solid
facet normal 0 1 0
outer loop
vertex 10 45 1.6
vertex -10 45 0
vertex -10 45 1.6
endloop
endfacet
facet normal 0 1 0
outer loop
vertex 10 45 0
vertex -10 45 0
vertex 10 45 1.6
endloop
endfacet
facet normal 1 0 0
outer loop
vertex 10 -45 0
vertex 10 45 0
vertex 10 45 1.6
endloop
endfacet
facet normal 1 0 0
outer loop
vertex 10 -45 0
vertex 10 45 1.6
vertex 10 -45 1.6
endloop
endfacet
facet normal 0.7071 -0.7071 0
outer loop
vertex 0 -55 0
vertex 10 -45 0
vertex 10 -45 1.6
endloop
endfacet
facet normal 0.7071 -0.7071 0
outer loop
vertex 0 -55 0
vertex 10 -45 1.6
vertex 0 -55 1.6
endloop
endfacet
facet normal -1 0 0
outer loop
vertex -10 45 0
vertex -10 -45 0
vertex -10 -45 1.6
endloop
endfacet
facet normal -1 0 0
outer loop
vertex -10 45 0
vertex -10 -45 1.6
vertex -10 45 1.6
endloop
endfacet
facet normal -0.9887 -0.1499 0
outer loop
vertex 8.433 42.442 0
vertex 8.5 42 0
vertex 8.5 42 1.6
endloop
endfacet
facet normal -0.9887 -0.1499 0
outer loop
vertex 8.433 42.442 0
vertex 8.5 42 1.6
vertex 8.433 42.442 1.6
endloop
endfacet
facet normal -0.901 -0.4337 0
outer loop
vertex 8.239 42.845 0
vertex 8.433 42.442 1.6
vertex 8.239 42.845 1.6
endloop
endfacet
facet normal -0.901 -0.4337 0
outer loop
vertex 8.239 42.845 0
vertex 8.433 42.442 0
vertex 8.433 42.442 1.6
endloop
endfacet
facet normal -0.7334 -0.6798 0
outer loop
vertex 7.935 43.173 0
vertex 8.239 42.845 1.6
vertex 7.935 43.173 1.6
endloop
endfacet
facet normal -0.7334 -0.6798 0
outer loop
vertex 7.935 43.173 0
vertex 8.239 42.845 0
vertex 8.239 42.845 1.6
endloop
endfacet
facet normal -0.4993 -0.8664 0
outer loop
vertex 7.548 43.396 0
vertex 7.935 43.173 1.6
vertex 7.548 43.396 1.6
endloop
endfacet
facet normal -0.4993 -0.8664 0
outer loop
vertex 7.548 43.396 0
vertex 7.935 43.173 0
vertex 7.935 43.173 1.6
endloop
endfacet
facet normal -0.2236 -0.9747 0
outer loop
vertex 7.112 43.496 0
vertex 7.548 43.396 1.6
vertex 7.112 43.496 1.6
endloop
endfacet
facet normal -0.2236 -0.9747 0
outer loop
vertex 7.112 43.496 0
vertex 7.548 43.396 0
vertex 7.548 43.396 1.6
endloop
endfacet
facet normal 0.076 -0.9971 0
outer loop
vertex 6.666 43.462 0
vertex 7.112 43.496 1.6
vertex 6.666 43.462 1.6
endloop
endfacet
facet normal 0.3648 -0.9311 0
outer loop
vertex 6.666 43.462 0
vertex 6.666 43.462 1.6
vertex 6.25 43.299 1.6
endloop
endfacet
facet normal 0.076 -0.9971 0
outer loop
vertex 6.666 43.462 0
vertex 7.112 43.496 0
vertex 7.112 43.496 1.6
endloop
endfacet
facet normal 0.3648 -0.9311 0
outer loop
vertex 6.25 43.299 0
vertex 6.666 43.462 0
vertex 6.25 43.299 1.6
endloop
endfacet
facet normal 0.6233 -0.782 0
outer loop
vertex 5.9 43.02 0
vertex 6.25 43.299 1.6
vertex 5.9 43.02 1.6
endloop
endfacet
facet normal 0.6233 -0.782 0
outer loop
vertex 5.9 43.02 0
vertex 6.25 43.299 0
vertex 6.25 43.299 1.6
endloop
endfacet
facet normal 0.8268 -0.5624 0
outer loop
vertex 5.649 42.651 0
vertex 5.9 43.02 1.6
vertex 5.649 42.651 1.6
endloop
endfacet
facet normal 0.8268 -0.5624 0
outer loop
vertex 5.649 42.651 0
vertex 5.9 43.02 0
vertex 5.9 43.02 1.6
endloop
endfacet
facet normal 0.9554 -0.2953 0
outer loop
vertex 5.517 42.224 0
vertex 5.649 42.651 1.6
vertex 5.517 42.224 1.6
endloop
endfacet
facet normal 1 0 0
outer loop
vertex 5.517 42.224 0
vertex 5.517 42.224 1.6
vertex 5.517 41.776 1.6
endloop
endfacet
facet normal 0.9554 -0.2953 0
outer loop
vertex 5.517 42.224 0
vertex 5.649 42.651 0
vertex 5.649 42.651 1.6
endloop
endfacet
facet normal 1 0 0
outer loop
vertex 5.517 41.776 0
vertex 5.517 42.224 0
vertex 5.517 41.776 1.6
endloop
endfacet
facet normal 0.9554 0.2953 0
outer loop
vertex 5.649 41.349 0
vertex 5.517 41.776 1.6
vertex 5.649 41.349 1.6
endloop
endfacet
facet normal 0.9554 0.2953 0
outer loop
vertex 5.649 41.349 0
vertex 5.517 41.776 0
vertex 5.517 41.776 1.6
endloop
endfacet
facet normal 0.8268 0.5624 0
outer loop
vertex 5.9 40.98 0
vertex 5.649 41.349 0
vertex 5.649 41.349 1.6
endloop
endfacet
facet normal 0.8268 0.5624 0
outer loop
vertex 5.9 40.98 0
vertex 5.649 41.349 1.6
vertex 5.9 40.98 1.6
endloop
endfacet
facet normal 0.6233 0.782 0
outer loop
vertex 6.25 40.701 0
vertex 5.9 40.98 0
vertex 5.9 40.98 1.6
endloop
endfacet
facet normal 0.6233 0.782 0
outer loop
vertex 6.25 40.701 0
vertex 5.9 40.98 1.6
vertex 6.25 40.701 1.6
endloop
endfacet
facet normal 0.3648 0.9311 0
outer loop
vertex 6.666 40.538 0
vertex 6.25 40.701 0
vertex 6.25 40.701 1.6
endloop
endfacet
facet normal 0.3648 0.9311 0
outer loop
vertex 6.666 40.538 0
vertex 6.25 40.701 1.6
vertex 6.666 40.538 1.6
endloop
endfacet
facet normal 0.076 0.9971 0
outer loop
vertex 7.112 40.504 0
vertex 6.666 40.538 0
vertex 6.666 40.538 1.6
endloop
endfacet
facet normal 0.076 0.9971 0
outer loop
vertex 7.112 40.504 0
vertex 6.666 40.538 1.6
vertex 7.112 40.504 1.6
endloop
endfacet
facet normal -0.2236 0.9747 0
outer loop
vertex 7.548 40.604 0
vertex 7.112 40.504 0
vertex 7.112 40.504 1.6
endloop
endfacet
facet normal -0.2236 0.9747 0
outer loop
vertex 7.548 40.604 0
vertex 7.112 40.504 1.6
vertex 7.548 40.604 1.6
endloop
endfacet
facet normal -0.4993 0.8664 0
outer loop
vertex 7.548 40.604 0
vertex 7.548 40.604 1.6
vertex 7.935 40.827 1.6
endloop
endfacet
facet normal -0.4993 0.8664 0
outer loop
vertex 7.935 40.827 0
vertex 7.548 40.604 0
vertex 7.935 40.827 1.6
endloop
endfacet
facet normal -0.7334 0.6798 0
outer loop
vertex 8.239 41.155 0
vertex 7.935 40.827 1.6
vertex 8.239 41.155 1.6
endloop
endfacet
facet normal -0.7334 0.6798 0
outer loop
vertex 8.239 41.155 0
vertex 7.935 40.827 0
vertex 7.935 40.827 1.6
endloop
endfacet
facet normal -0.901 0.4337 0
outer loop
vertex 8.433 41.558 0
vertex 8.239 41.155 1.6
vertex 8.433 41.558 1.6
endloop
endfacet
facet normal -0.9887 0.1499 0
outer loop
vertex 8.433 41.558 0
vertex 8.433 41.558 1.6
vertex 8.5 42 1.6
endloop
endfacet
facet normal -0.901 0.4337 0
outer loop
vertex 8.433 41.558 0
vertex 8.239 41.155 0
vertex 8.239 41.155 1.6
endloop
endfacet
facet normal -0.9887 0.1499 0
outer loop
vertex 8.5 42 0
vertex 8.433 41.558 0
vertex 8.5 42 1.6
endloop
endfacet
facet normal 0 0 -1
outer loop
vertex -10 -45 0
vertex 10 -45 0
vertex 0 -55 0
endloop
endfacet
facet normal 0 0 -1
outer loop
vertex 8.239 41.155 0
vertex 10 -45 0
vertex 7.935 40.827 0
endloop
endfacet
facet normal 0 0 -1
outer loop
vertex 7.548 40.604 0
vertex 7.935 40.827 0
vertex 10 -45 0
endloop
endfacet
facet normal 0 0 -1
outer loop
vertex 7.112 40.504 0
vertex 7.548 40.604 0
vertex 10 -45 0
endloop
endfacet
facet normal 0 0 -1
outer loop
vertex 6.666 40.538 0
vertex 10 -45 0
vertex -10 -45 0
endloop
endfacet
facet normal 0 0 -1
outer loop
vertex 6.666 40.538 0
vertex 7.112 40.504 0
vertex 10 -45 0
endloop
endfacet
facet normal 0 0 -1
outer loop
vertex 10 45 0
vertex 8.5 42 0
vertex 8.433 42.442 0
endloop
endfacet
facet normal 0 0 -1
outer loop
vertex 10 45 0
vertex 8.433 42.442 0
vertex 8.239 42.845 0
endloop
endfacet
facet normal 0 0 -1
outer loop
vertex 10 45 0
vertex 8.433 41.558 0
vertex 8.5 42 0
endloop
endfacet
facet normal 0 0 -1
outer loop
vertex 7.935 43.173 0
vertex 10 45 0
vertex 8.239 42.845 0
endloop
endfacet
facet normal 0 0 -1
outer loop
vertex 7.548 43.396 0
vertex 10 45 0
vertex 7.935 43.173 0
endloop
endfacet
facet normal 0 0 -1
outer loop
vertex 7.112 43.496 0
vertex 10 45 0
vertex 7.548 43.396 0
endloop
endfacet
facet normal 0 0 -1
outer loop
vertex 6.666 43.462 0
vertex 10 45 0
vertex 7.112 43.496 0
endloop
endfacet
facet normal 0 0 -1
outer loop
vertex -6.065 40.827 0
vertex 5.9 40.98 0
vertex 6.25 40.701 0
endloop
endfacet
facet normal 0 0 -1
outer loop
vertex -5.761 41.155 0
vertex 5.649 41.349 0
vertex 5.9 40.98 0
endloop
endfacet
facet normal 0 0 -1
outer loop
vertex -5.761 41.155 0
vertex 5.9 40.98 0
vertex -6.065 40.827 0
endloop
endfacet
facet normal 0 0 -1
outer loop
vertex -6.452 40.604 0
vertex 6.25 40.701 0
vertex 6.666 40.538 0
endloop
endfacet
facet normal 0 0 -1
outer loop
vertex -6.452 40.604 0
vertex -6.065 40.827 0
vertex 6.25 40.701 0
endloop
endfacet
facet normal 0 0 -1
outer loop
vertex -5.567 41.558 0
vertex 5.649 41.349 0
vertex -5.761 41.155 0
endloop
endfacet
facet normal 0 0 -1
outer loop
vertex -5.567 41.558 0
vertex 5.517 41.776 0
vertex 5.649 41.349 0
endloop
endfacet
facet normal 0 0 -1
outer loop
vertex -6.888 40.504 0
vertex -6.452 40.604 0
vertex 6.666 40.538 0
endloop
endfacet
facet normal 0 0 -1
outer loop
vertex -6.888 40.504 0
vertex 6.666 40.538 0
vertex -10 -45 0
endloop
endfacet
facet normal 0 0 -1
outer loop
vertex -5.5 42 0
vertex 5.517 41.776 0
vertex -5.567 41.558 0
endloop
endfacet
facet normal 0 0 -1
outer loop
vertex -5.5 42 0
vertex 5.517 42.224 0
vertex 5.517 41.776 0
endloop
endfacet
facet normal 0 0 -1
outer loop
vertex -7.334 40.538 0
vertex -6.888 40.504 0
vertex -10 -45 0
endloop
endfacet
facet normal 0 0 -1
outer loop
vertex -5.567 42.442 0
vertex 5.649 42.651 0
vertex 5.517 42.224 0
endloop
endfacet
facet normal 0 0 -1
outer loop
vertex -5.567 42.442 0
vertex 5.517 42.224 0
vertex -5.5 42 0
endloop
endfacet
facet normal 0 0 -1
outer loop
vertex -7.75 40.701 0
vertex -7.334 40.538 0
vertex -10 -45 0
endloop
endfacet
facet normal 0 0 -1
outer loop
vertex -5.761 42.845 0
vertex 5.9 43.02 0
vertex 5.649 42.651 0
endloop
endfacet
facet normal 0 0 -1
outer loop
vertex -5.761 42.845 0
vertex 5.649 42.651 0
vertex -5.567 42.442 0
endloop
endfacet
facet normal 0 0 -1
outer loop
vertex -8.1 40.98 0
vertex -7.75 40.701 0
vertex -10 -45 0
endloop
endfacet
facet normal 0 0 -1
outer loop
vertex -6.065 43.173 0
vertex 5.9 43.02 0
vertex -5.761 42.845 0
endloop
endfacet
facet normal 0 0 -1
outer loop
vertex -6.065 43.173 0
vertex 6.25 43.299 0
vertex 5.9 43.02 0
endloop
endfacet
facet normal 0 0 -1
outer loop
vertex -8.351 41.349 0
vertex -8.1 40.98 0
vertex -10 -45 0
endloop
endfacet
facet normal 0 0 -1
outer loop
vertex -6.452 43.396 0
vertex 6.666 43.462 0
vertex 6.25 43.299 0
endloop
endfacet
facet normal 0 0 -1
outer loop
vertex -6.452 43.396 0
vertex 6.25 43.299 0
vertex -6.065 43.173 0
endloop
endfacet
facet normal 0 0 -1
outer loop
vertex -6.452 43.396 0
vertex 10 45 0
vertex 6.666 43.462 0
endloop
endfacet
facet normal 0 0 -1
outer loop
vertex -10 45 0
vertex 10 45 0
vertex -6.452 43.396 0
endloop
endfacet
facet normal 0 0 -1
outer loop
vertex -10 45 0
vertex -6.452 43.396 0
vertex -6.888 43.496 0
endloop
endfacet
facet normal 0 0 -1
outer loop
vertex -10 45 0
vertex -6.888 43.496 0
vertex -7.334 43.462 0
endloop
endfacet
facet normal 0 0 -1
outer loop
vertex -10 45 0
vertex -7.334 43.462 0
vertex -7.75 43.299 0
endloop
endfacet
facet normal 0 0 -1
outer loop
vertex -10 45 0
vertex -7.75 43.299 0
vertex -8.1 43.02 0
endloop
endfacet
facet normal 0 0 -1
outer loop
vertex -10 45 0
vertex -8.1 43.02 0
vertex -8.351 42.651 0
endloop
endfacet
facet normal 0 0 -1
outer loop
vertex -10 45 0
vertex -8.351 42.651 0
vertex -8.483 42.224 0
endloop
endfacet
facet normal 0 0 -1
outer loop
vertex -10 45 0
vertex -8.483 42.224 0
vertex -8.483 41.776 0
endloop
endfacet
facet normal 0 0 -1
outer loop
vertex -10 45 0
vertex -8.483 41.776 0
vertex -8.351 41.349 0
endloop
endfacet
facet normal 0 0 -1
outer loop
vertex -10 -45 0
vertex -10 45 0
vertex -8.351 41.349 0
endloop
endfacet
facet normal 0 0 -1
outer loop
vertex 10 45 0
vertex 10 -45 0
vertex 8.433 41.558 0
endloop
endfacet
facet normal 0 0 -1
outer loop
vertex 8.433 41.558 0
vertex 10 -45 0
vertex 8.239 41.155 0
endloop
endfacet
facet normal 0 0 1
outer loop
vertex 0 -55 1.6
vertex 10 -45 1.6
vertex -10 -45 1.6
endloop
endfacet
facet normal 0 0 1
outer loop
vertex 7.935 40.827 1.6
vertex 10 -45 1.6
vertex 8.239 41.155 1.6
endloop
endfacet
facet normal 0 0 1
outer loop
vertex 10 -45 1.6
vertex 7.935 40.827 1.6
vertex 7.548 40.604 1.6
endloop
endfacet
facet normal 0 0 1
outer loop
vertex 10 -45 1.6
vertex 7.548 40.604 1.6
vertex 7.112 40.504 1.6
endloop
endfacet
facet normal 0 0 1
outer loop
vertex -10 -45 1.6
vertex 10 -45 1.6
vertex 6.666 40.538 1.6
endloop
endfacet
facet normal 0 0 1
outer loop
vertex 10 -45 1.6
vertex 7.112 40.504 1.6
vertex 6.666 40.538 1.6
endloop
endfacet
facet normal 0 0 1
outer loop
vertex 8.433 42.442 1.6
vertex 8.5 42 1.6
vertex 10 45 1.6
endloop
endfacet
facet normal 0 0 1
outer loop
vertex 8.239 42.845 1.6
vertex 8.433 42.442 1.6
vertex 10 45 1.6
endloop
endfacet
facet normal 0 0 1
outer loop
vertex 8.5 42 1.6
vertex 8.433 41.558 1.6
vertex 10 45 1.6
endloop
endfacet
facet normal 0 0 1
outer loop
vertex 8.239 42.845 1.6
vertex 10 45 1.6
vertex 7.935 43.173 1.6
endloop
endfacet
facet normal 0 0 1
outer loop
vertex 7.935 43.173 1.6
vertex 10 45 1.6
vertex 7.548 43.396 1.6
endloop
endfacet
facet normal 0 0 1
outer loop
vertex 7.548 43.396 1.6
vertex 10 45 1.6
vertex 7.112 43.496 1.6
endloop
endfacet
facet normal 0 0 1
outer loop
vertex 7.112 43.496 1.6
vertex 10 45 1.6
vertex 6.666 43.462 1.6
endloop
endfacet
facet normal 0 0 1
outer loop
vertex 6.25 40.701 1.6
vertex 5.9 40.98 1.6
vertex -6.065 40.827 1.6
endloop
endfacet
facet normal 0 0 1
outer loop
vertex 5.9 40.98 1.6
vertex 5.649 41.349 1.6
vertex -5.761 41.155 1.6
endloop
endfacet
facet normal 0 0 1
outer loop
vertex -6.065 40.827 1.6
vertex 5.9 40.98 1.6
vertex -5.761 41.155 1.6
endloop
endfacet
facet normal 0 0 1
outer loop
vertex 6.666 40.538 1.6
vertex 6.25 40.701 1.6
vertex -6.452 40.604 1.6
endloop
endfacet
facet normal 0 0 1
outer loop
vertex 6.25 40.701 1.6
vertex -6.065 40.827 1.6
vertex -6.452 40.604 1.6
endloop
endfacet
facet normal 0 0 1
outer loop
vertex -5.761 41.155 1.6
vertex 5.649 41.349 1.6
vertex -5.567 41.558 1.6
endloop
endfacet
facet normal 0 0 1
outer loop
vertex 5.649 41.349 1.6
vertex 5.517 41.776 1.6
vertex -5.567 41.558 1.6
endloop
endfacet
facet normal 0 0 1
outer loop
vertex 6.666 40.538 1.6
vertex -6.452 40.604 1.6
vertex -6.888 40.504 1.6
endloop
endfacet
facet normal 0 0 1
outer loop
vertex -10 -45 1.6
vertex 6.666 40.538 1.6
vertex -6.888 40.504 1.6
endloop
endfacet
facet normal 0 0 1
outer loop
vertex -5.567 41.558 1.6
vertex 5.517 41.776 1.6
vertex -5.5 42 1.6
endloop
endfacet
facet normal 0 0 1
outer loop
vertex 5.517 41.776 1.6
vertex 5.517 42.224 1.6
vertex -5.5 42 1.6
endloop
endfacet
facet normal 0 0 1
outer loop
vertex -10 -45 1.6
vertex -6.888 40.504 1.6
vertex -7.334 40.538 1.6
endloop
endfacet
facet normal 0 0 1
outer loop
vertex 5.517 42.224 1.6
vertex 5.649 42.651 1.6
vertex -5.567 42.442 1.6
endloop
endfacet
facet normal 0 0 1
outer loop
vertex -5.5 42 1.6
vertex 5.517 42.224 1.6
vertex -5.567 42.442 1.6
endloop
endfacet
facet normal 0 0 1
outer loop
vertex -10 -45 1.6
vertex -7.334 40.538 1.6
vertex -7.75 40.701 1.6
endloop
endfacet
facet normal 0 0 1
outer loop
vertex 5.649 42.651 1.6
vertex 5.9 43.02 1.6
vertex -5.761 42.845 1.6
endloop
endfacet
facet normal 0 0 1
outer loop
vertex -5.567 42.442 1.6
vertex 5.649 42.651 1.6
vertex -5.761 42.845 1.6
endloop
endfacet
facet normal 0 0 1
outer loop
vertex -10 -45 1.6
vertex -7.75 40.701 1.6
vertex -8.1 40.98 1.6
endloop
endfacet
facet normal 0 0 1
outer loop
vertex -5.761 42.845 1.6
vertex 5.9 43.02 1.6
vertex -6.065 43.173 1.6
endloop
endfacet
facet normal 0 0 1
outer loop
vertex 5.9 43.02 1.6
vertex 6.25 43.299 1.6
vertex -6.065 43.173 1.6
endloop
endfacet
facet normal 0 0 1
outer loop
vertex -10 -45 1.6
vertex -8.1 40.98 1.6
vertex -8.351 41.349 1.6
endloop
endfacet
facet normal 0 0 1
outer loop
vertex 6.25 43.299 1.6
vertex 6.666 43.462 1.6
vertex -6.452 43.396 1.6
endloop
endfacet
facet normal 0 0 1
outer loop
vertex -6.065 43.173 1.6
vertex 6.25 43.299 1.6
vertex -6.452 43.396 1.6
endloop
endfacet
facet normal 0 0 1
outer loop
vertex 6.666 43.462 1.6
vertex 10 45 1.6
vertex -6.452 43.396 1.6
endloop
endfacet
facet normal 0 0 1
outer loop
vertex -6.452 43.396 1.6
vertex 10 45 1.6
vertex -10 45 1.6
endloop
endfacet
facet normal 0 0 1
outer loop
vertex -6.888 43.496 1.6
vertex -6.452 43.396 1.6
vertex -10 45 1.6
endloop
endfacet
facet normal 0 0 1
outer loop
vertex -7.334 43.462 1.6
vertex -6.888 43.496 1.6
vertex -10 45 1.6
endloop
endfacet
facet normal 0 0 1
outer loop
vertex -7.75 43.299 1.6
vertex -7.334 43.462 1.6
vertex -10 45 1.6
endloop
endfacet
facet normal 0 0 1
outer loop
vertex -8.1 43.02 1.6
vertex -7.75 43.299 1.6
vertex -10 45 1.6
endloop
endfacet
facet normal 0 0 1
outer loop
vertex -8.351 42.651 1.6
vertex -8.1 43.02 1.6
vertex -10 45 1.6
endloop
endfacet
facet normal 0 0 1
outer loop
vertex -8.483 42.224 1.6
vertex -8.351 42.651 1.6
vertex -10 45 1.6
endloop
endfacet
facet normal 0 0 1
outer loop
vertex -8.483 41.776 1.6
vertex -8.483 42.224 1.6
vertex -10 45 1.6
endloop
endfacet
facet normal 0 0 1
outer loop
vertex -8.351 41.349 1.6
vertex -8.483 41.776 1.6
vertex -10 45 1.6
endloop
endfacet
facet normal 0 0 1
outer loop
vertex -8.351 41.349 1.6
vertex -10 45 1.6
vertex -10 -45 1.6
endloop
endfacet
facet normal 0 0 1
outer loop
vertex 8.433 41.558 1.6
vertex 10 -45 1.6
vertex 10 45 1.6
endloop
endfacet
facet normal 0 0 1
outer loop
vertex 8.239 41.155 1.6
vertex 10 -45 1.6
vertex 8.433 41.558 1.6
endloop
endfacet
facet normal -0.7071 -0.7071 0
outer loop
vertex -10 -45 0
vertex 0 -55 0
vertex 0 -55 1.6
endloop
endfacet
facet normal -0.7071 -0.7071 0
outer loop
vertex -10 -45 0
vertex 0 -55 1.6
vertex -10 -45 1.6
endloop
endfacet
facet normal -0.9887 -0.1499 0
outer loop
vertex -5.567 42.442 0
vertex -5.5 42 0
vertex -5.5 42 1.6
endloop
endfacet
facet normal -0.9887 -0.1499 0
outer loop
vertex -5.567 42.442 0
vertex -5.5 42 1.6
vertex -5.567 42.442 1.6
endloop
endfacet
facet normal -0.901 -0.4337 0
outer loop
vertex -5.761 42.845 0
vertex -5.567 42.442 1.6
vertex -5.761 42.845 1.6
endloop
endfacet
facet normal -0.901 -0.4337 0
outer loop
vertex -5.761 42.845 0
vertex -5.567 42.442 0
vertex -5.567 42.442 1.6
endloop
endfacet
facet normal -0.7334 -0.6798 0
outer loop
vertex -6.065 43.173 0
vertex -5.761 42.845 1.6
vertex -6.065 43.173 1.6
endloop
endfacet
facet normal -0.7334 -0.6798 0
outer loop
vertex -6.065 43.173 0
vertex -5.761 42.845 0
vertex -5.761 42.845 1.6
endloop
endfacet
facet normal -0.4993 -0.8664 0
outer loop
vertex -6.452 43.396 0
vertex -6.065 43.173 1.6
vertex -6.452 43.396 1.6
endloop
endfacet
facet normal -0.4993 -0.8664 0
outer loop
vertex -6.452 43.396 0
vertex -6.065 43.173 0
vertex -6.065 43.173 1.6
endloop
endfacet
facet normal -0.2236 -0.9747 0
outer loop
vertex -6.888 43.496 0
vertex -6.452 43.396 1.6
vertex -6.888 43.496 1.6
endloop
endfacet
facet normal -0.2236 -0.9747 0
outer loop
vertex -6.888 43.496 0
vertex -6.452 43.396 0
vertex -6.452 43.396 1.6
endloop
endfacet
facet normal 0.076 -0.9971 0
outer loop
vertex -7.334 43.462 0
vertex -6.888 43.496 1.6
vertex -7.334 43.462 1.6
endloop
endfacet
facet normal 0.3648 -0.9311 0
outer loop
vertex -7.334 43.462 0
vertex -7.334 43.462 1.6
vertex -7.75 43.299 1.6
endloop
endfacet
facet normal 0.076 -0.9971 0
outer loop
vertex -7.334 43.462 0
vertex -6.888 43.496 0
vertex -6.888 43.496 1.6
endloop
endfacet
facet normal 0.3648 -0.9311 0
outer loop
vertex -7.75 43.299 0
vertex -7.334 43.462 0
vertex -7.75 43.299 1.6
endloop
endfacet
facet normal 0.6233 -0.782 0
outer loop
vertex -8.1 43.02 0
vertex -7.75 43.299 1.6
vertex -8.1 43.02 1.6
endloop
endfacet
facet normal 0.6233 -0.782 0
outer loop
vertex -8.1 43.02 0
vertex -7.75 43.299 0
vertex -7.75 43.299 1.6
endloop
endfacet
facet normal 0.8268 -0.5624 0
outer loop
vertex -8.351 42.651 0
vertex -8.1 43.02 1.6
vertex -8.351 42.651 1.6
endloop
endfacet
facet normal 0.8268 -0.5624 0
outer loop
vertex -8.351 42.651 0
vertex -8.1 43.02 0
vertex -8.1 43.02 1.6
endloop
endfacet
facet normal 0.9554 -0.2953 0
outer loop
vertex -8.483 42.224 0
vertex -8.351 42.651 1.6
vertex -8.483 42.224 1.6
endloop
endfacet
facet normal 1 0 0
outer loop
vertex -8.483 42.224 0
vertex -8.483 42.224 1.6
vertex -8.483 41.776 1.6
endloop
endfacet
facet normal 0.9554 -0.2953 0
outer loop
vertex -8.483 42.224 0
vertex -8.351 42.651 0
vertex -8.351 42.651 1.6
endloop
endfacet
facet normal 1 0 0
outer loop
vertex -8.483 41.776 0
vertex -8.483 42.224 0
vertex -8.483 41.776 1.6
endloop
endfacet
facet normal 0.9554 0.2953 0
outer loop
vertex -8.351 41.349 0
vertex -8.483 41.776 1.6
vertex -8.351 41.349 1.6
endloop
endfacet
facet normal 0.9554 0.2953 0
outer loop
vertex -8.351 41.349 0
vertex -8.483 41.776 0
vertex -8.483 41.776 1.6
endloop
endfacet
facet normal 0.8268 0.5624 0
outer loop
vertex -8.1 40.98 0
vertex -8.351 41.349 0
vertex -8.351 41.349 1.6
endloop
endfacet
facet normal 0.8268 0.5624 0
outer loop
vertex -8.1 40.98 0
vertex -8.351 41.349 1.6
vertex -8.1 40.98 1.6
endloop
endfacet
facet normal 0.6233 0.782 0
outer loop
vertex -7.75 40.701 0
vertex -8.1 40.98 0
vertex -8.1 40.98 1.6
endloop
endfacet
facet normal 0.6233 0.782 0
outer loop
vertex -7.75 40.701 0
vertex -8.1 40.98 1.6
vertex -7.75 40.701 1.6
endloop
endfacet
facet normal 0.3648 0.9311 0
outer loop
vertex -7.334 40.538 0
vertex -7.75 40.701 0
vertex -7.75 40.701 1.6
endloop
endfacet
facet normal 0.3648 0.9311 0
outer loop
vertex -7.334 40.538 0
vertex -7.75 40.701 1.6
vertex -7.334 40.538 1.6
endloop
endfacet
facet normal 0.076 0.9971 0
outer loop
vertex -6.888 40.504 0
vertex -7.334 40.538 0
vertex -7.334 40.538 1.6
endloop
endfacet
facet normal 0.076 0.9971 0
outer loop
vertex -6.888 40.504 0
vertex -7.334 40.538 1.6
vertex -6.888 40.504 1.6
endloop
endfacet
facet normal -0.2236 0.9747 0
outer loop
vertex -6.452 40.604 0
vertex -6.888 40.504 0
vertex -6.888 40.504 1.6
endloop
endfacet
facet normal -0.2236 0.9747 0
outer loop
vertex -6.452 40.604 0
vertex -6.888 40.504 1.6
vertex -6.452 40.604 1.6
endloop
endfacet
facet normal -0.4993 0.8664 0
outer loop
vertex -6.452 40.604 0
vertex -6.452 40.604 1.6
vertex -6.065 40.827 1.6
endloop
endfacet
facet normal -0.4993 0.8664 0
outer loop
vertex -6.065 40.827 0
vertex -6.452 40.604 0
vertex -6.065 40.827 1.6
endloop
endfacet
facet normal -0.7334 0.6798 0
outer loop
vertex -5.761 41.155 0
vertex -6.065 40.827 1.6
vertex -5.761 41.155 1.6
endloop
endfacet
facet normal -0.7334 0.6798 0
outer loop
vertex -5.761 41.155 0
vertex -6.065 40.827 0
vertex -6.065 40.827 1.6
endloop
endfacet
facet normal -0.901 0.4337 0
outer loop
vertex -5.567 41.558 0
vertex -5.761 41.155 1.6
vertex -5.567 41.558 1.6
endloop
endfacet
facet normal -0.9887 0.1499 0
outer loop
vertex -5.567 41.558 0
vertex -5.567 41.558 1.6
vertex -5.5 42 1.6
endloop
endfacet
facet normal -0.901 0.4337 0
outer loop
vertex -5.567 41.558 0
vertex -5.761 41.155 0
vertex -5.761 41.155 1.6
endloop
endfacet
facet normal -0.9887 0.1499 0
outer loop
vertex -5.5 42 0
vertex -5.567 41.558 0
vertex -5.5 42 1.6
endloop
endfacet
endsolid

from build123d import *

# Parameters (mm, degrees)
IZIM1_R                     = 1.5
Y_KSEKLIK_EKSTR_ZYON1_DEPTH = 1.6


with BuildPart() as part:
    # Çizim1 → Yükseklik-Ekstrüzyon1 (new body)
    with BuildSketch(Plane.XY):
        Polygon((0, -55), (-10, -45), (-10, 45), (10, 45), (10, -45), align=None)
        with Locations((-7, 42)):
            Circle(IZIM1_R, mode=Mode.SUBTRACT)
        with Locations((7, 42)):
            Circle(IZIM1_R, mode=Mode.SUBTRACT)
    extrude(amount=Y_KSEKLIK_EKSTR_ZYON1_DEPTH)


solid = part.part
